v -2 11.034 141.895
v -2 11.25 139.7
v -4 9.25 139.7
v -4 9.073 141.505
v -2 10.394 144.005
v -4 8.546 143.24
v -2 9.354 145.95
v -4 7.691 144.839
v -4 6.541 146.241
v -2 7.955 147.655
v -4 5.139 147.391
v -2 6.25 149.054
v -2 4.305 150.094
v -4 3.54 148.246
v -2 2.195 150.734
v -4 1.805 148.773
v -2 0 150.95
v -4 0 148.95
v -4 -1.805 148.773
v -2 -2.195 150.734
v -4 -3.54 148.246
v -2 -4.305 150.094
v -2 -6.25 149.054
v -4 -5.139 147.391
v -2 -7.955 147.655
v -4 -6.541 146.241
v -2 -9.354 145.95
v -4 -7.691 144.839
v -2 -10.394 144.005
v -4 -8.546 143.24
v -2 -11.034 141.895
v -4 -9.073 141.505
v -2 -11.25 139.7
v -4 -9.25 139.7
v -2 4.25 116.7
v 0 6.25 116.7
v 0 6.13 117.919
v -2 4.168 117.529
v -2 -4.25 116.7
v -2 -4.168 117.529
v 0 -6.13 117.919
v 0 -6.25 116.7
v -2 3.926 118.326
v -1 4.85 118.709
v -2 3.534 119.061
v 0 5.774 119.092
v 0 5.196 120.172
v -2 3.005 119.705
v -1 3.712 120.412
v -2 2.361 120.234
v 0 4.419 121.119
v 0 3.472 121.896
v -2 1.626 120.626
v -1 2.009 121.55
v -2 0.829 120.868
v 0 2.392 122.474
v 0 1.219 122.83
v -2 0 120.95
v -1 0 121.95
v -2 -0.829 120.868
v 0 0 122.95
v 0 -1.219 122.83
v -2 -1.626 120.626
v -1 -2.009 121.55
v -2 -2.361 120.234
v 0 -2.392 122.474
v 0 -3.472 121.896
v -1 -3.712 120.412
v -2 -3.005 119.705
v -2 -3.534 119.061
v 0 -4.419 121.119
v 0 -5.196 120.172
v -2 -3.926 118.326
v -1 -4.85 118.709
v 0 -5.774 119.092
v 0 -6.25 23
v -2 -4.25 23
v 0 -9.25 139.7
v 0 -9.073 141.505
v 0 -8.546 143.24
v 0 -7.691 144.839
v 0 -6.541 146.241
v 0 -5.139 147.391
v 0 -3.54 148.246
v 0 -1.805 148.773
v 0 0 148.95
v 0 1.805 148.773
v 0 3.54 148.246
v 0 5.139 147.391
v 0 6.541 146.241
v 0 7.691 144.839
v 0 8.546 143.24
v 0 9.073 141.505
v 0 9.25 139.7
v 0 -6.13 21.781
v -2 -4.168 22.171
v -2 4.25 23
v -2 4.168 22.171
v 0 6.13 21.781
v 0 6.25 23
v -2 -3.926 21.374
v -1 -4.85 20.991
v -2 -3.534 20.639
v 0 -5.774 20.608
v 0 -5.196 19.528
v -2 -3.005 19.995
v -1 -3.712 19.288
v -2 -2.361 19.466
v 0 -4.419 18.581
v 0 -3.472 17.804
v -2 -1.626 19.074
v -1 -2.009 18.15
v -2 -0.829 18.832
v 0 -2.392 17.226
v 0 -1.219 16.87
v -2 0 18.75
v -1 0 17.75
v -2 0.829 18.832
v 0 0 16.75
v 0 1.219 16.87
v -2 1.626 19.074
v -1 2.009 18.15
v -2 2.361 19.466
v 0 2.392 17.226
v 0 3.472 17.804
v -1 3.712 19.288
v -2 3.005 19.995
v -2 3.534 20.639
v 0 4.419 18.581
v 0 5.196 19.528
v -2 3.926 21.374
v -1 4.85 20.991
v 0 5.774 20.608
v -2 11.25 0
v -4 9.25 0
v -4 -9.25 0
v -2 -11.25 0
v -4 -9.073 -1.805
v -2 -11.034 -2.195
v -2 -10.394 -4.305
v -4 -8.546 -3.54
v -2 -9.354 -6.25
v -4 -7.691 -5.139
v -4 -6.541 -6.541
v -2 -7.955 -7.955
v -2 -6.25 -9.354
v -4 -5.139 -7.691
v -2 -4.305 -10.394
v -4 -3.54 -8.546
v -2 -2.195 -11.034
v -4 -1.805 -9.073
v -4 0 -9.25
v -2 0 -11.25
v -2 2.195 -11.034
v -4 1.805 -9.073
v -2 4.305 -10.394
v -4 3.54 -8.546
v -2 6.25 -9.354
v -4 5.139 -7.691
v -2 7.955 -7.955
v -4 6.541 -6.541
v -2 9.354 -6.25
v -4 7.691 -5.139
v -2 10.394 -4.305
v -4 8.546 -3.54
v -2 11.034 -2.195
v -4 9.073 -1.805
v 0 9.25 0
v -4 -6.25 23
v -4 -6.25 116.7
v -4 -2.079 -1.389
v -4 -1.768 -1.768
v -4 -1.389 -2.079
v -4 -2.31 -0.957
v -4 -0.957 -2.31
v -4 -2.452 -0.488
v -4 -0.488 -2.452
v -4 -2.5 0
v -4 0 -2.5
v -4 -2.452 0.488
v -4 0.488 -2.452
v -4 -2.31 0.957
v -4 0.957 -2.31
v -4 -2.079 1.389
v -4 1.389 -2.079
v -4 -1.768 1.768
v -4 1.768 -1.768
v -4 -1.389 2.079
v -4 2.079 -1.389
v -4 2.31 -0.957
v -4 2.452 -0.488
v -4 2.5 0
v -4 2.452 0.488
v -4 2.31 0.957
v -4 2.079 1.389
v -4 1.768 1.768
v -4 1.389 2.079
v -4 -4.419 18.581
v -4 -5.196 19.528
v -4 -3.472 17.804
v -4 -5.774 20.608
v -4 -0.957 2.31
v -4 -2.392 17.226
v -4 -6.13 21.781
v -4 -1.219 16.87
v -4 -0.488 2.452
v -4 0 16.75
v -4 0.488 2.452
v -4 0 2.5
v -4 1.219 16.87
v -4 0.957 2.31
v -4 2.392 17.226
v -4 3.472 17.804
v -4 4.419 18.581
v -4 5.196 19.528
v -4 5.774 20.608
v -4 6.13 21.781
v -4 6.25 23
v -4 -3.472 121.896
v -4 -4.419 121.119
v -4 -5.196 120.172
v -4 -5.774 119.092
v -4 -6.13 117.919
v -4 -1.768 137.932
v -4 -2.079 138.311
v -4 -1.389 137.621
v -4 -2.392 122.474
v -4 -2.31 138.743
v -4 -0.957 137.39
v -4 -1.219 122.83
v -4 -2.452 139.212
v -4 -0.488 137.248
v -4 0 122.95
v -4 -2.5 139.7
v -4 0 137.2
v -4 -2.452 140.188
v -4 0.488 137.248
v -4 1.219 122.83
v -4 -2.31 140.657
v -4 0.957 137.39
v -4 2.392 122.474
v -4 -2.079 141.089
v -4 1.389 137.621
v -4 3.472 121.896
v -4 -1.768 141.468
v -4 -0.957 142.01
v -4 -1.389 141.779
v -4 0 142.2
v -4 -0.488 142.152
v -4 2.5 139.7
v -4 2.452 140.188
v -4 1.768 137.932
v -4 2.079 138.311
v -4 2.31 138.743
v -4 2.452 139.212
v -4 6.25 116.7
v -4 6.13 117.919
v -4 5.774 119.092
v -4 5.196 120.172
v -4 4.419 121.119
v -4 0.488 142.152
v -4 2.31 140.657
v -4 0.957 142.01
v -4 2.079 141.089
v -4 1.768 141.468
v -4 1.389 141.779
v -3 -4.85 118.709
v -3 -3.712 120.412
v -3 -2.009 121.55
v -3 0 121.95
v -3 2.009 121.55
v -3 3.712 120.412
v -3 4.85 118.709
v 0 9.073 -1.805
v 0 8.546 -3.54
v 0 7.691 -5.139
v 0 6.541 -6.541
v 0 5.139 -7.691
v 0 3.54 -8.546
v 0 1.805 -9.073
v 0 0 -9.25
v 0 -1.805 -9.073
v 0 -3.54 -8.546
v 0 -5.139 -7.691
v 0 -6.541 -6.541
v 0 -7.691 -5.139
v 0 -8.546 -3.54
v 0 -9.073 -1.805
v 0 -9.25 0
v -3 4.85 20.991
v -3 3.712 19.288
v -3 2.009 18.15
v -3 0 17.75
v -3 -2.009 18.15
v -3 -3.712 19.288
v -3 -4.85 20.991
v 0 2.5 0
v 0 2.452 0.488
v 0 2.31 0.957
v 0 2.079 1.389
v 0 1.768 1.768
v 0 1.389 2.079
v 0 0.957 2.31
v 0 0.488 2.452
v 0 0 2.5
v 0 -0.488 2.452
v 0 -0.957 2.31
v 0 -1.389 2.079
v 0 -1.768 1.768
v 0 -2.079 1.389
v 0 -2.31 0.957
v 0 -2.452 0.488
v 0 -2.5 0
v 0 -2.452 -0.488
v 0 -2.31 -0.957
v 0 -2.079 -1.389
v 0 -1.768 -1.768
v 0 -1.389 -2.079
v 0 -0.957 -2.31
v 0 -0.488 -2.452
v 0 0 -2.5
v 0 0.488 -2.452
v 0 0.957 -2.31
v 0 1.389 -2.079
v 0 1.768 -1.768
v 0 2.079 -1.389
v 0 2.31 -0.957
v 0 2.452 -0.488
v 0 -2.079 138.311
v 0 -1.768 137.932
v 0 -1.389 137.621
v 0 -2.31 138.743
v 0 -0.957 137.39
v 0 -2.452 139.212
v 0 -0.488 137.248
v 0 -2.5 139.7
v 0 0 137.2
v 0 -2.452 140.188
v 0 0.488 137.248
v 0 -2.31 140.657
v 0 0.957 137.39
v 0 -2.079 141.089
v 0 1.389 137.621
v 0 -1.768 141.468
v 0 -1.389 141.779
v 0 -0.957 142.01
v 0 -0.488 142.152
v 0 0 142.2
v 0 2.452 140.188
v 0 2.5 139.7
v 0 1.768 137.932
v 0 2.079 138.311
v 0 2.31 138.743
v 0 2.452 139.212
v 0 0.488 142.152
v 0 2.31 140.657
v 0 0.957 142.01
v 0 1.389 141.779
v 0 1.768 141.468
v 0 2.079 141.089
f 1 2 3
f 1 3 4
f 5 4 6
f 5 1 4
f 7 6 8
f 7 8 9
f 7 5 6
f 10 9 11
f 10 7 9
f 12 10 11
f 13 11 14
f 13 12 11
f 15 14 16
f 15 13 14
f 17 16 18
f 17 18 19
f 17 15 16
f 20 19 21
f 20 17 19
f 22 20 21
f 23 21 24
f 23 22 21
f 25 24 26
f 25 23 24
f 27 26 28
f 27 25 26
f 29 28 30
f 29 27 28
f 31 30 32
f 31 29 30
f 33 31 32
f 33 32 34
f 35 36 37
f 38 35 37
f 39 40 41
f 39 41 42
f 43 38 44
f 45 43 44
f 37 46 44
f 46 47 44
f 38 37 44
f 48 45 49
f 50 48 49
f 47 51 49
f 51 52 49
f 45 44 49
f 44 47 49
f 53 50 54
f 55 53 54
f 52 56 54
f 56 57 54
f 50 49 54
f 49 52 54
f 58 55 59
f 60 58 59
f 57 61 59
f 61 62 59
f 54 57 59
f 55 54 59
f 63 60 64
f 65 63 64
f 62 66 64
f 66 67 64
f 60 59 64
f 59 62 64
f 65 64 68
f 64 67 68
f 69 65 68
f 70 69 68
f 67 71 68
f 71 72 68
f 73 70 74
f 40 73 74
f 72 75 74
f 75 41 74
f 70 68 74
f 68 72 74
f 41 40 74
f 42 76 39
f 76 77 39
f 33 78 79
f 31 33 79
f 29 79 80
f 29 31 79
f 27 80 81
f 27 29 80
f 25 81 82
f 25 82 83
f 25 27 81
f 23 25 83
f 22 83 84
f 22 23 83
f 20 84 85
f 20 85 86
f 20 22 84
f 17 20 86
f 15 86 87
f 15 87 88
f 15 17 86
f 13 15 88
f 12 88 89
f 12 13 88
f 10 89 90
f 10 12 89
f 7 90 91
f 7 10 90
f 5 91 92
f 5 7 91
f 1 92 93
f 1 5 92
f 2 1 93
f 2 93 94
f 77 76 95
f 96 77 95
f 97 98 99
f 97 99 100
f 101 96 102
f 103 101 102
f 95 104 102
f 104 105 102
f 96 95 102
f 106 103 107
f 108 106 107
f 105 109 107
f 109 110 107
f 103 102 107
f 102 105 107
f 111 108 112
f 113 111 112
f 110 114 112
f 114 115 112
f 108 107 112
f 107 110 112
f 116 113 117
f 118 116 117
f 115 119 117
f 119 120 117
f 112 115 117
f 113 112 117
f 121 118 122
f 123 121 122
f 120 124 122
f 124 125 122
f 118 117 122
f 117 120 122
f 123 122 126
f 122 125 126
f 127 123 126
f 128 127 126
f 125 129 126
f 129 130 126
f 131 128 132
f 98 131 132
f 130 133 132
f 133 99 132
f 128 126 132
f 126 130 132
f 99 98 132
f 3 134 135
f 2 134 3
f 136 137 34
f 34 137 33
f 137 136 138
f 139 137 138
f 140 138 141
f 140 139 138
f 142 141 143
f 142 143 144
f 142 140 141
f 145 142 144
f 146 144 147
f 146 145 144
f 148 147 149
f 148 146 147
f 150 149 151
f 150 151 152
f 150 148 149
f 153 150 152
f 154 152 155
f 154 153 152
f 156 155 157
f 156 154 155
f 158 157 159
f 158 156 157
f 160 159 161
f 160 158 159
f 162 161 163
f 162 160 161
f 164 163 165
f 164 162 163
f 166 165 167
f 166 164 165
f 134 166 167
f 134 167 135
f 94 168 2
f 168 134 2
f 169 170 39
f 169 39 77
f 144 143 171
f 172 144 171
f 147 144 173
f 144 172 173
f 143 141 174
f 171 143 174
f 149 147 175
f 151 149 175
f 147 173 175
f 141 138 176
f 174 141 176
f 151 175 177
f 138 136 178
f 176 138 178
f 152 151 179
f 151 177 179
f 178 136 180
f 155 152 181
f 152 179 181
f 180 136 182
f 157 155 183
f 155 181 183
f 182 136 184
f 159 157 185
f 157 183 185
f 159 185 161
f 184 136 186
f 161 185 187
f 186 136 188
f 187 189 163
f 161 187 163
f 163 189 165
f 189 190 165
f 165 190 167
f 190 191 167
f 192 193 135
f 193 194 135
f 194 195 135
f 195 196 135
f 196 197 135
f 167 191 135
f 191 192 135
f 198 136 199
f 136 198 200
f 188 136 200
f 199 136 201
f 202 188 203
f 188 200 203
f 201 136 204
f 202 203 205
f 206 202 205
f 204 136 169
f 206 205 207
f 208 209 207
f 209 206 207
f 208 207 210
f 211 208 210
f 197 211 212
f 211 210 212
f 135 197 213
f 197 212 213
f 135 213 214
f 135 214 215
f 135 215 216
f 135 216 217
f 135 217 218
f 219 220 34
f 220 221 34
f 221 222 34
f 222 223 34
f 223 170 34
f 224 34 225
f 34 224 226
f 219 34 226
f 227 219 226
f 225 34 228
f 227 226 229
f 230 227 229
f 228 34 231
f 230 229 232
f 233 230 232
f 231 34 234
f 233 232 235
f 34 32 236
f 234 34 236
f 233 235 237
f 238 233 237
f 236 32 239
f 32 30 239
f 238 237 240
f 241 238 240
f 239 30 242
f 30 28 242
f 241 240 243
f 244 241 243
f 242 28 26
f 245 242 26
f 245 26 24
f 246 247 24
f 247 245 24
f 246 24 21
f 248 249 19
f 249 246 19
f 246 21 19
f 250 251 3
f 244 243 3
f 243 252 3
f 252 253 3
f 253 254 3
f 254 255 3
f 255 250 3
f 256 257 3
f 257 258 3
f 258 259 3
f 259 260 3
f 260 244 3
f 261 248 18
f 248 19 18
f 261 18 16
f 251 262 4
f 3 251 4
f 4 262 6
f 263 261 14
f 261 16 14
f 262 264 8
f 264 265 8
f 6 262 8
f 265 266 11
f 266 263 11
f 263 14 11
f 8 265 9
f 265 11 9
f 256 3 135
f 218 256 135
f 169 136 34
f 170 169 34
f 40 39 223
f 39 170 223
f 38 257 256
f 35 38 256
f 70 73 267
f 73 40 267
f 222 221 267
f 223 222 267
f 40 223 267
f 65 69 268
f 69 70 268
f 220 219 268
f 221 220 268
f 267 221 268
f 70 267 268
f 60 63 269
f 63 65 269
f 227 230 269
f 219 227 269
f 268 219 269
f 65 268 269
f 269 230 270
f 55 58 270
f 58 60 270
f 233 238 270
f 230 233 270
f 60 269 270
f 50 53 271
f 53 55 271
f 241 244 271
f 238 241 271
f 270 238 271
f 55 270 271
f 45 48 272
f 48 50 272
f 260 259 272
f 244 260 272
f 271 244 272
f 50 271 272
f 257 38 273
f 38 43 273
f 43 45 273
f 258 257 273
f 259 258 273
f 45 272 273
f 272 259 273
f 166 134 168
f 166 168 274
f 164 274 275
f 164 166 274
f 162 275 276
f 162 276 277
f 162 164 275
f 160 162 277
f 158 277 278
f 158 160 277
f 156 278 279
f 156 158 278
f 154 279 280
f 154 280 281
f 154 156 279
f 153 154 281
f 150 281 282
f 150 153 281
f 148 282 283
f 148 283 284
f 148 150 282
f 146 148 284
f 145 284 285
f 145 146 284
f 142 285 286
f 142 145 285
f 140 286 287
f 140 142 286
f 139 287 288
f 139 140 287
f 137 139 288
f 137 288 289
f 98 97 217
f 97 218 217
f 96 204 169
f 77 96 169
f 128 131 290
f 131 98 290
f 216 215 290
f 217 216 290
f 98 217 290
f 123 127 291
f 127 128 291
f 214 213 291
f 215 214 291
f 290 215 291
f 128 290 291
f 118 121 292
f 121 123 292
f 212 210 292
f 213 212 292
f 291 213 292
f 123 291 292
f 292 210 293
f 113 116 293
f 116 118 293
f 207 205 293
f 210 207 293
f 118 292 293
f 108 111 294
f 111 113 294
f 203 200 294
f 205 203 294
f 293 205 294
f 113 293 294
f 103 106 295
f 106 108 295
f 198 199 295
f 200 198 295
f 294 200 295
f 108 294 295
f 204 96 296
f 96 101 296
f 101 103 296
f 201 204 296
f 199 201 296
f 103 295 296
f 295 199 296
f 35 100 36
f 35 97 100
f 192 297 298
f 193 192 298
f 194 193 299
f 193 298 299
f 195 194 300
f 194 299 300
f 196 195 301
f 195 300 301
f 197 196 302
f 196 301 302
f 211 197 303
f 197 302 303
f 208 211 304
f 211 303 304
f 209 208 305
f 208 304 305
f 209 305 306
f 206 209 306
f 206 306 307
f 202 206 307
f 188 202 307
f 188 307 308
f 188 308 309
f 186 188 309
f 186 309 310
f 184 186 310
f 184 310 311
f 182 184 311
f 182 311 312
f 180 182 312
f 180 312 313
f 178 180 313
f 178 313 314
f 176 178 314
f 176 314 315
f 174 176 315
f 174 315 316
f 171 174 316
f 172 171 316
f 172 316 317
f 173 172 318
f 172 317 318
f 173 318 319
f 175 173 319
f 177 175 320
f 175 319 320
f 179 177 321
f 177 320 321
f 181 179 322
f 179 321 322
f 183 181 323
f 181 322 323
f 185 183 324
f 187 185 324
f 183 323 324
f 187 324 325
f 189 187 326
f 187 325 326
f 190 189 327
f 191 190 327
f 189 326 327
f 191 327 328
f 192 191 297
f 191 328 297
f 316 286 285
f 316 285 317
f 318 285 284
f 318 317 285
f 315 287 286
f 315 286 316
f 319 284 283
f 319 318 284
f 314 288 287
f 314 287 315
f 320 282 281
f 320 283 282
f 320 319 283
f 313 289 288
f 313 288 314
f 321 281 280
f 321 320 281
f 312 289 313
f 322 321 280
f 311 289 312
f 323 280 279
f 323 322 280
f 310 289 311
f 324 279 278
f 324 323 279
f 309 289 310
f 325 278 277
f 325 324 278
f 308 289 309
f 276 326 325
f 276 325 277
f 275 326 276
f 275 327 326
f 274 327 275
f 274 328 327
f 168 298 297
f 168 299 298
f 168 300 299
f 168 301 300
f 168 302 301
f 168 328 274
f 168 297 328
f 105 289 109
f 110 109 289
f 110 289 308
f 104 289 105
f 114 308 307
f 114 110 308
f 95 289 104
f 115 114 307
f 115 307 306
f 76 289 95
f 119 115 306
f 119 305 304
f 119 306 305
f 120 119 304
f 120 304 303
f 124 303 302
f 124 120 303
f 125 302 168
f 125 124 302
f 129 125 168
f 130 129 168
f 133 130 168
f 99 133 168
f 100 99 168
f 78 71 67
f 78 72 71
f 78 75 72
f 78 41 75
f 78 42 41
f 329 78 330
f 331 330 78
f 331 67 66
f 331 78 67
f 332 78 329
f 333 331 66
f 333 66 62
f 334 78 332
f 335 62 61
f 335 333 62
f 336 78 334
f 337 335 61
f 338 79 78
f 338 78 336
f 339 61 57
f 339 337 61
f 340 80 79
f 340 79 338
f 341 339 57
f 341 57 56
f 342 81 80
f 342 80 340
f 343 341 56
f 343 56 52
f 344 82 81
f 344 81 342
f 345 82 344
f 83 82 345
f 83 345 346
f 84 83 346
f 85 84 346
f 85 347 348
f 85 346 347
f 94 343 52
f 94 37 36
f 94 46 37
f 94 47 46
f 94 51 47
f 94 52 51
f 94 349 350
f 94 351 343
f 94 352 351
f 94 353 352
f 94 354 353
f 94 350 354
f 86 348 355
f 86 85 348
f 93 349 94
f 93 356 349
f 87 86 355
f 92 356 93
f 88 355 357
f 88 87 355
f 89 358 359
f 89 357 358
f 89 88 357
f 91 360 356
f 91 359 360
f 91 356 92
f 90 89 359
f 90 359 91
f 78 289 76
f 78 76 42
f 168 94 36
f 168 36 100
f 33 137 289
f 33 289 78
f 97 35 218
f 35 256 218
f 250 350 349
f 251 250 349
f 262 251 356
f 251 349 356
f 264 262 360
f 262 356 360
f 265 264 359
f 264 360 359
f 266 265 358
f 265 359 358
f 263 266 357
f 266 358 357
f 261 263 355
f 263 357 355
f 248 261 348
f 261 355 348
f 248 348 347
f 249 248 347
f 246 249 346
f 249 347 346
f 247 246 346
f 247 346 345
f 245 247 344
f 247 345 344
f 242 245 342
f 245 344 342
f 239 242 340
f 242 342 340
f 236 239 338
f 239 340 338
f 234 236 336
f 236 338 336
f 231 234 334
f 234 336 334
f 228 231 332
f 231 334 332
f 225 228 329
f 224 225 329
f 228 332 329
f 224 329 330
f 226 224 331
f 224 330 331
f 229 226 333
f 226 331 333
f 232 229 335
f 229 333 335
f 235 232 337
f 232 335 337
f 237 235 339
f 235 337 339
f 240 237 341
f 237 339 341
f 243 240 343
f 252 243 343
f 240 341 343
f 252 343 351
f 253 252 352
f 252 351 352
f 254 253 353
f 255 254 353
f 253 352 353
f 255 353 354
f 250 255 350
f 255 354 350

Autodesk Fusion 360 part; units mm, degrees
sketch "Sketch1" plane through (0, 0, 0) normal (1, 0, 0) x (0, 1, 0)
  line L0 (2.8, 6) -> (2.8, 5.1079)
  arc A0 (2.8, 6) -> (-2.8, 6) centre (0, 6) ccw
  arc A1 (-2.8, 5.1079) -> (2.8, 5.1079) centre (0, 0) ccw
  line L1 (-2.8, 5.1079) -> (-2.8, 6)
  circle A2 centre (0, 0) radius 2.5
  circle A3 centre (0, 0) radius 11.25
  circle A4 centre (0, 0) radius 2.5
  line L2 (2.8, 6) -> (2.8, 5.1079)
  circle A5 centre (0, 0) radius 11.25
  line L3 (-2.8, 5.1079) -> (-2.8, 6)
  arc A6 (2.8, 6) -> (-2.8, 6) centre (0, 6) ccw
  arc A7 (-2.8, 5.1079) -> (2.8, 5.1079) centre (0, 0) ccw
  arc A8 (-2.8, 144.8079) -> (2.8, 144.8079) centre (0, 139.7) ccw
  line L4 (2.8, 145.7) -> (2.8, 144.8079)
  circle A9 centre (0, 139.7) radius 11.25
  circle A10 centre (0, 139.7) radius 11.25
  circle A11 centre (0, 139.7) radius 2.5
  line L5 (-2.8, 144.8079) -> (-2.8, 145.7)
  line L6 (2.8, 145.7) -> (2.8, 144.8079)
  circle A12 centre (0, 139.7) radius 2.5
  arc A13 (2.8, 145.7) -> (-2.8, 145.7) centre (0, 145.7) ccw
  arc A14 (2.8, 145.7) -> (-2.8, 145.7) centre (0, 145.7) ccw
  line L7 (-2.8, 144.8079) -> (-2.8, 145.7)
  arc A15 (-2.8, 144.8079) -> (2.8, 144.8079) centre (0, 139.7) ccw
  line L8 (0, 139.7) -> (0, 0) construction
  line L9 (0, 139.7) -> (-11.25, 139.7) construction
  line L10 (0, 0) -> (-11.25, 0) construction
  line L11 (0, 69.85) -> (50, 69.85) construction
  arc A16 (-7.2247, 139.7) -> (-7.2753, 140.1491) centre (-629.3846, 69.85) ccw
  arc A17 (-7.2753, -0.4491) -> (-7.2247, 0) centre (-629.3846, 69.85) ccw
  line L12 (11.25, 139.7) -> (11.25, 0)
  line L13 (-11.25, 139.7) -> (-11.25, 0)
  arc A18 (7.25, 116.7) -> (-7.25, 116.7) centre (0, 116.7) ccw
  arc A19 (-7.25, 23) -> (7.25, 23) centre (0, 23) ccw
  line L14 (-7.25, 116.7) -> (-7.25, 23)
  line L15 (7.25, 116.7) -> (7.25, 23)
  circle A20 centre (0, 128.45) radius 2.25
  circle A21 centre (0, 11.25) radius 2.25
  arc A22 (-4.25, 23) -> (4.25, 23) centre (0, 23) ccw
  line L16 (4.25, 116.7) -> (4.25, 23)
  arc A23 (4.25, 116.7) -> (-4.25, 116.7) centre (0, 116.7) ccw
  line L17 (-4.25, 116.7) -> (-4.25, 23)
  point P0 (0, 5.375)
  point P1 (0, 5.375)
  point P2 (0, 150.95)
  point P3 (0, 145.075)
  point P4 (0, 150.95)
  point P5 (0, 139.7)
  point P6 (0, 139.7)
  point P7 (0, 145.075)
  dimension "d1" = 11.65
  dimension "d3" = 5.6
  dimension "d4" = 6
  dimension "d5" = 5
  dimension "d6" = 22.5
  dimension "d8" = 11.65
  dimension "d9" = 5.6
  dimension "d10" = 6
  dimension "d11" = 5
  dimension "d12" = 22.5
  dimension "d14" = 11.65
  dimension "d15" = 5.6
  dimension "d16" = 6
  dimension "d17" = 5
  dimension "d18" = 22.5
  dimension "d19" = 11.65
  dimension "d20" = 5.6
  dimension "d21" = 6
  dimension "d22" = 5
  dimension "d23" = 22.5
  dimension "d60" = 4.5
  dimension "d63" = -3
extrude "Extrude1" add sketch "Sketch1" against normal blind 4 contours L0 A0 A1 L1 L2 L3 A6 A7 | A3 A5 A21 | A3 A5 A9 A10 L12 L13 A20 A21 | A3 A5 A21 | A3 A5 A21 | A9 A10 A20 | A9 A10 A20 | A9 A10 A20 | A8 L4 L5 L6 A13 A14 L7 A15 | A18 A19 L14 L15
ref_plane "WorkPlane1" through (25.5, 0, 69.85) normal (1, 0, 0) x (0, 1, 0)
chamfer "Chamfer1" distance 2 angle 45 8 edges at (0, 11.25, 69.85) (0, 0, -11.25) (0, -11.25, 69.85) (0, 0, 150.95) (-4, 0, 150.95) (-4, 11.25, 69.85) (-4, 0, -11.25) (-4, -11.25, 69.85)
chamfer "Chamfer3" distance 2 angle 45 8 edges at (0, 0, 120.95) (0, 4.25, 69.85) (0, 0, 18.75) (0, -4.25, 69.85) (-4, 0, 120.95) (-4, -4.25, 69.85) (-4, 0, 18.75) (-4, 4.25, 69.85)
sketch "Sketch2" plane through (25.5, 0, 0) normal (1, 0, 0) x (0, 1, 0)
  arc A0 (-2.8, 144.8079) -> (2.8, 144.8079) centre (0, 139.7) ccw
  arc A1 (2.8, 145.7) -> (-2.8, 145.7) centre (0, 145.7) ccw
  line L0 (11.25, 139.7) -> (11.25, 0)
  line L1 (0, 139.7) -> (0, 0) construction
  circle A2 centre (0, 139.7) radius 11.25
  line L2 (-2.8, 144.8079) -> (-2.8, 145.7)
  circle A3 centre (0, 139.7) radius 11.25
  line L3 (-11.25, 139.7) -> (-11.25, 0)
  circle A4 centre (0, 0) radius 11.25
  line L4 (2.8, 145.7) -> (2.8, 144.8079)
  circle A5 centre (0, 139.7) radius 2.5
  line L5 (0, 139.7) -> (-11.25, 139.7) construction
  line L6 (2.8, 145.7) -> (2.8, 144.8079)
  arc A6 (7.25, 116.7) -> (-7.25, 116.7) centre (0, 116.7) ccw
  circle A7 centre (0, 139.7) radius 2.5
  arc A8 (-7.2247, 139.7) -> (-7.2753, 140.1491) centre (-629.3846, 69.85) ccw
  arc A9 (2.8, 145.7) -> (-2.8, 145.7) centre (0, 145.7) ccw
  line L7 (-2.8, 144.8079) -> (-2.8, 145.7)
  line L8 (-7.25, 116.7) -> (-7.25, 23)
  line L9 (7.25, 116.7) -> (7.25, 23)
  arc A10 (-2.8, 144.8079) -> (2.8, 144.8079) centre (0, 139.7) ccw
  circle A11 centre (0, 0) radius 2.5
  arc A12 (2.8, 6) -> (-2.8, 6) centre (0, 6) ccw
  arc A13 (2.8, 6) -> (-2.8, 6) centre (0, 6) ccw
  line L10 (-2.8, 5.1079) -> (-2.8, 6)
  line L11 (2.8, 6) -> (2.8, 5.1079)
  circle A14 centre (0, 0) radius 2.5
  arc A15 (-2.8, 5.1079) -> (2.8, 5.1079) centre (0, 0) ccw
  arc A16 (-2.8, 5.1079) -> (2.8, 5.1079) centre (0, 0) ccw
  line L12 (2.8, 6) -> (2.8, 5.1079)
  arc A17 (-7.25, 23) -> (7.25, 23) centre (0, 23) ccw
  arc A18 (-7.2753, -0.4491) -> (-7.2247, 0) centre (-629.3846, 69.85) ccw
  circle A19 centre (0, 0) radius 11.25
  line L13 (0, 0) -> (-11.25, 0) construction
  line L14 (-2.8, 5.1079) -> (-2.8, 6)
  point P0 (0, 69.85)
  point P1 (0, 150.95)
  point P2 (0, 139.7)
  point P3 (0, 145.075)
  point P4 (0, 150.95)
  point P5 (0, 5.375)
  point P6 (0, 145.075)
  point P7 (0, 139.7)
  point P8 (0, 5.375)
  dimension "d36" = 11.65
  dimension "d37" = 5.6
  dimension "d38" = 6
  dimension "d39" = 5
  dimension "d40" = 22.5
  dimension "d41" = 11.65
  dimension "d42" = 5.6
  dimension "d43" = 6
  dimension "d44" = 5
  dimension "d45" = 22.5
  dimension "d46" = 11.65
  dimension "d47" = 5.6
  dimension "d48" = 6
  dimension "d49" = 5
  dimension "d50" = 22.5
  dimension "d51" = 11.65
  dimension "d52" = 5.6
  dimension "d53" = 6
  dimension "d54" = 5
  dimension "d55" = 22.5
  dimension "d56" = 4
  dimension "d57" = 4
extrude "Extrude2" [suppressed]
